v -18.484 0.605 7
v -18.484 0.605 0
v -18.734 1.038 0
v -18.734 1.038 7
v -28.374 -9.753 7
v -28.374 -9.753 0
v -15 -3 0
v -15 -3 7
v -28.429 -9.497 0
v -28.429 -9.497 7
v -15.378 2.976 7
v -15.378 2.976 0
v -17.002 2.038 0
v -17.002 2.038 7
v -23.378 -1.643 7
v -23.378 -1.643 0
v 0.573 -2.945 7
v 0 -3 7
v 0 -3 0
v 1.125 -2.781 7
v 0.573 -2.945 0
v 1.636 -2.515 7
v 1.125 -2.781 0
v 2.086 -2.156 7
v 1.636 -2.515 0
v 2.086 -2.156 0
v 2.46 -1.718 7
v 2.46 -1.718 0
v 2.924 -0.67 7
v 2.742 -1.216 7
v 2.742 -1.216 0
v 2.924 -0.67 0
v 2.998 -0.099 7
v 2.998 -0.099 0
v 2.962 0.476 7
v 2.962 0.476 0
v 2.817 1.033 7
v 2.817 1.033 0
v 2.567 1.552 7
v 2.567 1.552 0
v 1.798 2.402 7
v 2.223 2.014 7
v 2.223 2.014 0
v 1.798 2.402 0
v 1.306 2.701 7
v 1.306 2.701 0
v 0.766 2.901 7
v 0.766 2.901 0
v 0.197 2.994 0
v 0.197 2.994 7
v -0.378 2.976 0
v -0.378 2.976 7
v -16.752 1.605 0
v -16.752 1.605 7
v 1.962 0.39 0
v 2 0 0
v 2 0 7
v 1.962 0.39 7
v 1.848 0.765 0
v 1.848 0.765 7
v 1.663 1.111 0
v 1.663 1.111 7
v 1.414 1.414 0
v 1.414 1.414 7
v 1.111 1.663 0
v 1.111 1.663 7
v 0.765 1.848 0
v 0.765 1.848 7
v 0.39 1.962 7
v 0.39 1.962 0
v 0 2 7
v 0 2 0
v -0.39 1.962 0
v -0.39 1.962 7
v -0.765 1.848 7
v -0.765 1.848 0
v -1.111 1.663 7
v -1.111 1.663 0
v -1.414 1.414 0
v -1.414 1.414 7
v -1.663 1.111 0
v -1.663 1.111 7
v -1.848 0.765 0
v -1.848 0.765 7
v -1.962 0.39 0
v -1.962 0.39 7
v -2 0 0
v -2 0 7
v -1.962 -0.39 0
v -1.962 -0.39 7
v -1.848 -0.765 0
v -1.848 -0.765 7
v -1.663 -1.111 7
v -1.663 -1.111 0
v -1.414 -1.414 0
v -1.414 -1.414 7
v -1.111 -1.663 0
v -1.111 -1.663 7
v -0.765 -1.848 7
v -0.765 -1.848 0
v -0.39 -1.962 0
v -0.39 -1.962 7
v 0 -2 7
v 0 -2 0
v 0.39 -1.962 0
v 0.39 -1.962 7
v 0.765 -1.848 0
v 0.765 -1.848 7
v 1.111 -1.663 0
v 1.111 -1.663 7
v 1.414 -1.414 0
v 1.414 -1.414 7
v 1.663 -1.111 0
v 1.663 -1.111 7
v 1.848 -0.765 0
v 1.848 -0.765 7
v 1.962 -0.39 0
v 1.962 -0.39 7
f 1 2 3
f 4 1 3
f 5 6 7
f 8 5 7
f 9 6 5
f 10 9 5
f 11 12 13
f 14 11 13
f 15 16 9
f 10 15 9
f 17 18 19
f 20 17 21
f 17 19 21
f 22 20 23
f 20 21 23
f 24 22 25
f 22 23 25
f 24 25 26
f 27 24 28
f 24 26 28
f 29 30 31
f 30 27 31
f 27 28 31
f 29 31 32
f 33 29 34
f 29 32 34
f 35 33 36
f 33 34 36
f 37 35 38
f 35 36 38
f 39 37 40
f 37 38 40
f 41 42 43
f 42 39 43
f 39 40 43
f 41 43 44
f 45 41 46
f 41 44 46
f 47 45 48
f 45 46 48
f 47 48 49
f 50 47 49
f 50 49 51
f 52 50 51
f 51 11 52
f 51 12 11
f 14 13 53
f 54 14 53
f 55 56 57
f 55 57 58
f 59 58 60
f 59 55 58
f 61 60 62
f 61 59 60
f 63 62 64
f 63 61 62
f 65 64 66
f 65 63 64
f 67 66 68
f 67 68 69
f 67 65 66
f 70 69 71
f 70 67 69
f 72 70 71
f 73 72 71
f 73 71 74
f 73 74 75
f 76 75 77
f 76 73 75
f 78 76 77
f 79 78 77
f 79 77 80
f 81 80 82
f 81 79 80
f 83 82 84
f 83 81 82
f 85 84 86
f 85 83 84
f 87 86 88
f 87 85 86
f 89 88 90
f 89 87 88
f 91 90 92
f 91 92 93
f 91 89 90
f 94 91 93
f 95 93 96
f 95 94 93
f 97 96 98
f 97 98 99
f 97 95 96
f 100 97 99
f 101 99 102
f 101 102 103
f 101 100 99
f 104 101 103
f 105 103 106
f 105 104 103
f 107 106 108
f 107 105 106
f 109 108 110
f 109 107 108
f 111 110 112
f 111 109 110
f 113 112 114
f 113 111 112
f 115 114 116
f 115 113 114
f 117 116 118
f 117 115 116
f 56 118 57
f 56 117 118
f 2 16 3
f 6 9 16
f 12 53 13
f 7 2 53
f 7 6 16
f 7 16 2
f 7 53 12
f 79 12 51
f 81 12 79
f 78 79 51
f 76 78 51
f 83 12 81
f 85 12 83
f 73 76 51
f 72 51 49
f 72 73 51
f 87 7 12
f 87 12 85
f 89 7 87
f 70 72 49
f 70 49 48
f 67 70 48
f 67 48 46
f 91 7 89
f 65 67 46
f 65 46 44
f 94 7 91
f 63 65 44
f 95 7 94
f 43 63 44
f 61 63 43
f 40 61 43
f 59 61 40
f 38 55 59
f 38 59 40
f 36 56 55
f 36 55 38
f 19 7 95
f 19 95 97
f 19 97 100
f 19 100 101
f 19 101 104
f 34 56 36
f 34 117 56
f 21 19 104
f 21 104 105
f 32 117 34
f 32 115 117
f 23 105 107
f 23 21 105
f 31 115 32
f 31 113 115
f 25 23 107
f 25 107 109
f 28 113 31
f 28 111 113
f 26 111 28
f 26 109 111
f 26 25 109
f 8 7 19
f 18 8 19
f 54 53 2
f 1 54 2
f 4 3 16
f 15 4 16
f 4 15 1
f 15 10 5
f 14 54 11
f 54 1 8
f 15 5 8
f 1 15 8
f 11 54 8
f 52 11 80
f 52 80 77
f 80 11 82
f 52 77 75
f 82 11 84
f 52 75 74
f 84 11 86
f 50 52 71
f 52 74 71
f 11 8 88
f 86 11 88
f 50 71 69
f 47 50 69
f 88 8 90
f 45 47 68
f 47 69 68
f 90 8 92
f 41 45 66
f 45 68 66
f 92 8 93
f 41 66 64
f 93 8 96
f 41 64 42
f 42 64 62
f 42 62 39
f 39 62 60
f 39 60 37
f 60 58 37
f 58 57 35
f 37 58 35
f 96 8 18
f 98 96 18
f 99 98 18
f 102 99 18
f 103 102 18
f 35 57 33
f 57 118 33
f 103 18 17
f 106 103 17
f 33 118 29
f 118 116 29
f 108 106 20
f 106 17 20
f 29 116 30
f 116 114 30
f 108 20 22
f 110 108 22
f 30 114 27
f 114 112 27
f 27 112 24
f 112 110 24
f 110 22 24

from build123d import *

# Parameters (mm, degrees)
SKETCH_1_R          = 3
SKETCH_1_R_2        = 2
EXTRUDE_1_DEPTH     = 7
SKETCH_2_R          = 2
EXTRUDE_2_DEPTH     = 7
CHAMFER_1_SIZE      = 0.5
CHAMFER_1_SIZE2     = 0.365244226
SKETCH_3_W          = 2
SKETCH_3_H          = 0.5
CUT_EXTRUDE_1_DEPTH = 7
SKETCH_4_W          = 2
SKETCH_4_H          = 7
EXTRUDE_3_DEPTH     = 0.5


with BuildPart() as part:
    # 草图1 → 凸台-拉伸1 (new body)
    with BuildSketch(Plane.XY):
        Circle(SKETCH_1_R)
        Circle(SKETCH_1_R_2, mode=Mode.SUBTRACT)
    extrude(amount=EXTRUDE_1_DEPTH)

    # 草图2 → 凸台-拉伸2 (add)
    with BuildSketch(Plane(origin=(0, 0, 0), x_dir=(-1, 0, 0), z_dir=(0, 0, -1))):
        with BuildLine():
            Line((0.378213472, 2.976063603), (15.378213472, 2.976063603))
            Line((15.378213472, 2.976063603), (23.378213472, -1.64273855))
            Line((23.378213472, -1.64273855), (28.699571557, -9.91799539))
            Line((28.699571557, -9.91799539), (15, -3))
            Line((15, -3), (0, -3))
            ThreePointArc((0, -3), (-2.994009921, 0.189485079), (0.378213472, 2.976063603))
        make_face()
        with Locations(Location((0, 0, 0), (0, 0, 180))):
            Circle(SKETCH_2_R, mode=Mode.SUBTRACT)
    extrude(amount=-EXTRUDE_2_DEPTH)

    # 倒角1
    chamfer_1_edges = [part.edges().sort_by_distance(p)[0] for p in [
        (-28.699571557, -9.91799539, 3.5),
    ]]
    chamfer_1_side = [part.faces().sort_by_distance(p)[0] for p in [
        (-26.038892515, -5.78036697, 3.5),
    ]]
    chamfer(chamfer_1_edges, length=CHAMFER_1_SIZE, length2=CHAMFER_1_SIZE2, reference=chamfer_1_side[0])

    # 草图3 → 切除-拉伸1 (cut)
    with BuildSketch(Plane(origin=(0, 0, 0), x_dir=(-1, 0, 0), z_dir=(0, 0, -1))):
        with Locations((11, 2.726063603)):
            Rectangle(SKETCH_3_W, SKETCH_3_H)
        Polygon((17.002138833, 2.038489859), (16.752138833, 1.605477157), (18.484189641, 0.605477157), (18.734189641, 1.038489859), align=None)
    extrude(amount=-CUT_EXTRUDE_1_DEPTH, mode=Mode.SUBTRACT)

    # 草图4 → 凸台-拉伸3 (add)
    with BuildSketch(Plane(origin=(0, 2.476063603, 0), x_dir=(1, 0, 0), z_dir=(0, 1, 0))):
        with Locations((-11, -3.5)):
            Rectangle(SKETCH_4_W, SKETCH_4_H)
    extrude(amount=EXTRUDE_3_DEPTH)


solid = part.part
